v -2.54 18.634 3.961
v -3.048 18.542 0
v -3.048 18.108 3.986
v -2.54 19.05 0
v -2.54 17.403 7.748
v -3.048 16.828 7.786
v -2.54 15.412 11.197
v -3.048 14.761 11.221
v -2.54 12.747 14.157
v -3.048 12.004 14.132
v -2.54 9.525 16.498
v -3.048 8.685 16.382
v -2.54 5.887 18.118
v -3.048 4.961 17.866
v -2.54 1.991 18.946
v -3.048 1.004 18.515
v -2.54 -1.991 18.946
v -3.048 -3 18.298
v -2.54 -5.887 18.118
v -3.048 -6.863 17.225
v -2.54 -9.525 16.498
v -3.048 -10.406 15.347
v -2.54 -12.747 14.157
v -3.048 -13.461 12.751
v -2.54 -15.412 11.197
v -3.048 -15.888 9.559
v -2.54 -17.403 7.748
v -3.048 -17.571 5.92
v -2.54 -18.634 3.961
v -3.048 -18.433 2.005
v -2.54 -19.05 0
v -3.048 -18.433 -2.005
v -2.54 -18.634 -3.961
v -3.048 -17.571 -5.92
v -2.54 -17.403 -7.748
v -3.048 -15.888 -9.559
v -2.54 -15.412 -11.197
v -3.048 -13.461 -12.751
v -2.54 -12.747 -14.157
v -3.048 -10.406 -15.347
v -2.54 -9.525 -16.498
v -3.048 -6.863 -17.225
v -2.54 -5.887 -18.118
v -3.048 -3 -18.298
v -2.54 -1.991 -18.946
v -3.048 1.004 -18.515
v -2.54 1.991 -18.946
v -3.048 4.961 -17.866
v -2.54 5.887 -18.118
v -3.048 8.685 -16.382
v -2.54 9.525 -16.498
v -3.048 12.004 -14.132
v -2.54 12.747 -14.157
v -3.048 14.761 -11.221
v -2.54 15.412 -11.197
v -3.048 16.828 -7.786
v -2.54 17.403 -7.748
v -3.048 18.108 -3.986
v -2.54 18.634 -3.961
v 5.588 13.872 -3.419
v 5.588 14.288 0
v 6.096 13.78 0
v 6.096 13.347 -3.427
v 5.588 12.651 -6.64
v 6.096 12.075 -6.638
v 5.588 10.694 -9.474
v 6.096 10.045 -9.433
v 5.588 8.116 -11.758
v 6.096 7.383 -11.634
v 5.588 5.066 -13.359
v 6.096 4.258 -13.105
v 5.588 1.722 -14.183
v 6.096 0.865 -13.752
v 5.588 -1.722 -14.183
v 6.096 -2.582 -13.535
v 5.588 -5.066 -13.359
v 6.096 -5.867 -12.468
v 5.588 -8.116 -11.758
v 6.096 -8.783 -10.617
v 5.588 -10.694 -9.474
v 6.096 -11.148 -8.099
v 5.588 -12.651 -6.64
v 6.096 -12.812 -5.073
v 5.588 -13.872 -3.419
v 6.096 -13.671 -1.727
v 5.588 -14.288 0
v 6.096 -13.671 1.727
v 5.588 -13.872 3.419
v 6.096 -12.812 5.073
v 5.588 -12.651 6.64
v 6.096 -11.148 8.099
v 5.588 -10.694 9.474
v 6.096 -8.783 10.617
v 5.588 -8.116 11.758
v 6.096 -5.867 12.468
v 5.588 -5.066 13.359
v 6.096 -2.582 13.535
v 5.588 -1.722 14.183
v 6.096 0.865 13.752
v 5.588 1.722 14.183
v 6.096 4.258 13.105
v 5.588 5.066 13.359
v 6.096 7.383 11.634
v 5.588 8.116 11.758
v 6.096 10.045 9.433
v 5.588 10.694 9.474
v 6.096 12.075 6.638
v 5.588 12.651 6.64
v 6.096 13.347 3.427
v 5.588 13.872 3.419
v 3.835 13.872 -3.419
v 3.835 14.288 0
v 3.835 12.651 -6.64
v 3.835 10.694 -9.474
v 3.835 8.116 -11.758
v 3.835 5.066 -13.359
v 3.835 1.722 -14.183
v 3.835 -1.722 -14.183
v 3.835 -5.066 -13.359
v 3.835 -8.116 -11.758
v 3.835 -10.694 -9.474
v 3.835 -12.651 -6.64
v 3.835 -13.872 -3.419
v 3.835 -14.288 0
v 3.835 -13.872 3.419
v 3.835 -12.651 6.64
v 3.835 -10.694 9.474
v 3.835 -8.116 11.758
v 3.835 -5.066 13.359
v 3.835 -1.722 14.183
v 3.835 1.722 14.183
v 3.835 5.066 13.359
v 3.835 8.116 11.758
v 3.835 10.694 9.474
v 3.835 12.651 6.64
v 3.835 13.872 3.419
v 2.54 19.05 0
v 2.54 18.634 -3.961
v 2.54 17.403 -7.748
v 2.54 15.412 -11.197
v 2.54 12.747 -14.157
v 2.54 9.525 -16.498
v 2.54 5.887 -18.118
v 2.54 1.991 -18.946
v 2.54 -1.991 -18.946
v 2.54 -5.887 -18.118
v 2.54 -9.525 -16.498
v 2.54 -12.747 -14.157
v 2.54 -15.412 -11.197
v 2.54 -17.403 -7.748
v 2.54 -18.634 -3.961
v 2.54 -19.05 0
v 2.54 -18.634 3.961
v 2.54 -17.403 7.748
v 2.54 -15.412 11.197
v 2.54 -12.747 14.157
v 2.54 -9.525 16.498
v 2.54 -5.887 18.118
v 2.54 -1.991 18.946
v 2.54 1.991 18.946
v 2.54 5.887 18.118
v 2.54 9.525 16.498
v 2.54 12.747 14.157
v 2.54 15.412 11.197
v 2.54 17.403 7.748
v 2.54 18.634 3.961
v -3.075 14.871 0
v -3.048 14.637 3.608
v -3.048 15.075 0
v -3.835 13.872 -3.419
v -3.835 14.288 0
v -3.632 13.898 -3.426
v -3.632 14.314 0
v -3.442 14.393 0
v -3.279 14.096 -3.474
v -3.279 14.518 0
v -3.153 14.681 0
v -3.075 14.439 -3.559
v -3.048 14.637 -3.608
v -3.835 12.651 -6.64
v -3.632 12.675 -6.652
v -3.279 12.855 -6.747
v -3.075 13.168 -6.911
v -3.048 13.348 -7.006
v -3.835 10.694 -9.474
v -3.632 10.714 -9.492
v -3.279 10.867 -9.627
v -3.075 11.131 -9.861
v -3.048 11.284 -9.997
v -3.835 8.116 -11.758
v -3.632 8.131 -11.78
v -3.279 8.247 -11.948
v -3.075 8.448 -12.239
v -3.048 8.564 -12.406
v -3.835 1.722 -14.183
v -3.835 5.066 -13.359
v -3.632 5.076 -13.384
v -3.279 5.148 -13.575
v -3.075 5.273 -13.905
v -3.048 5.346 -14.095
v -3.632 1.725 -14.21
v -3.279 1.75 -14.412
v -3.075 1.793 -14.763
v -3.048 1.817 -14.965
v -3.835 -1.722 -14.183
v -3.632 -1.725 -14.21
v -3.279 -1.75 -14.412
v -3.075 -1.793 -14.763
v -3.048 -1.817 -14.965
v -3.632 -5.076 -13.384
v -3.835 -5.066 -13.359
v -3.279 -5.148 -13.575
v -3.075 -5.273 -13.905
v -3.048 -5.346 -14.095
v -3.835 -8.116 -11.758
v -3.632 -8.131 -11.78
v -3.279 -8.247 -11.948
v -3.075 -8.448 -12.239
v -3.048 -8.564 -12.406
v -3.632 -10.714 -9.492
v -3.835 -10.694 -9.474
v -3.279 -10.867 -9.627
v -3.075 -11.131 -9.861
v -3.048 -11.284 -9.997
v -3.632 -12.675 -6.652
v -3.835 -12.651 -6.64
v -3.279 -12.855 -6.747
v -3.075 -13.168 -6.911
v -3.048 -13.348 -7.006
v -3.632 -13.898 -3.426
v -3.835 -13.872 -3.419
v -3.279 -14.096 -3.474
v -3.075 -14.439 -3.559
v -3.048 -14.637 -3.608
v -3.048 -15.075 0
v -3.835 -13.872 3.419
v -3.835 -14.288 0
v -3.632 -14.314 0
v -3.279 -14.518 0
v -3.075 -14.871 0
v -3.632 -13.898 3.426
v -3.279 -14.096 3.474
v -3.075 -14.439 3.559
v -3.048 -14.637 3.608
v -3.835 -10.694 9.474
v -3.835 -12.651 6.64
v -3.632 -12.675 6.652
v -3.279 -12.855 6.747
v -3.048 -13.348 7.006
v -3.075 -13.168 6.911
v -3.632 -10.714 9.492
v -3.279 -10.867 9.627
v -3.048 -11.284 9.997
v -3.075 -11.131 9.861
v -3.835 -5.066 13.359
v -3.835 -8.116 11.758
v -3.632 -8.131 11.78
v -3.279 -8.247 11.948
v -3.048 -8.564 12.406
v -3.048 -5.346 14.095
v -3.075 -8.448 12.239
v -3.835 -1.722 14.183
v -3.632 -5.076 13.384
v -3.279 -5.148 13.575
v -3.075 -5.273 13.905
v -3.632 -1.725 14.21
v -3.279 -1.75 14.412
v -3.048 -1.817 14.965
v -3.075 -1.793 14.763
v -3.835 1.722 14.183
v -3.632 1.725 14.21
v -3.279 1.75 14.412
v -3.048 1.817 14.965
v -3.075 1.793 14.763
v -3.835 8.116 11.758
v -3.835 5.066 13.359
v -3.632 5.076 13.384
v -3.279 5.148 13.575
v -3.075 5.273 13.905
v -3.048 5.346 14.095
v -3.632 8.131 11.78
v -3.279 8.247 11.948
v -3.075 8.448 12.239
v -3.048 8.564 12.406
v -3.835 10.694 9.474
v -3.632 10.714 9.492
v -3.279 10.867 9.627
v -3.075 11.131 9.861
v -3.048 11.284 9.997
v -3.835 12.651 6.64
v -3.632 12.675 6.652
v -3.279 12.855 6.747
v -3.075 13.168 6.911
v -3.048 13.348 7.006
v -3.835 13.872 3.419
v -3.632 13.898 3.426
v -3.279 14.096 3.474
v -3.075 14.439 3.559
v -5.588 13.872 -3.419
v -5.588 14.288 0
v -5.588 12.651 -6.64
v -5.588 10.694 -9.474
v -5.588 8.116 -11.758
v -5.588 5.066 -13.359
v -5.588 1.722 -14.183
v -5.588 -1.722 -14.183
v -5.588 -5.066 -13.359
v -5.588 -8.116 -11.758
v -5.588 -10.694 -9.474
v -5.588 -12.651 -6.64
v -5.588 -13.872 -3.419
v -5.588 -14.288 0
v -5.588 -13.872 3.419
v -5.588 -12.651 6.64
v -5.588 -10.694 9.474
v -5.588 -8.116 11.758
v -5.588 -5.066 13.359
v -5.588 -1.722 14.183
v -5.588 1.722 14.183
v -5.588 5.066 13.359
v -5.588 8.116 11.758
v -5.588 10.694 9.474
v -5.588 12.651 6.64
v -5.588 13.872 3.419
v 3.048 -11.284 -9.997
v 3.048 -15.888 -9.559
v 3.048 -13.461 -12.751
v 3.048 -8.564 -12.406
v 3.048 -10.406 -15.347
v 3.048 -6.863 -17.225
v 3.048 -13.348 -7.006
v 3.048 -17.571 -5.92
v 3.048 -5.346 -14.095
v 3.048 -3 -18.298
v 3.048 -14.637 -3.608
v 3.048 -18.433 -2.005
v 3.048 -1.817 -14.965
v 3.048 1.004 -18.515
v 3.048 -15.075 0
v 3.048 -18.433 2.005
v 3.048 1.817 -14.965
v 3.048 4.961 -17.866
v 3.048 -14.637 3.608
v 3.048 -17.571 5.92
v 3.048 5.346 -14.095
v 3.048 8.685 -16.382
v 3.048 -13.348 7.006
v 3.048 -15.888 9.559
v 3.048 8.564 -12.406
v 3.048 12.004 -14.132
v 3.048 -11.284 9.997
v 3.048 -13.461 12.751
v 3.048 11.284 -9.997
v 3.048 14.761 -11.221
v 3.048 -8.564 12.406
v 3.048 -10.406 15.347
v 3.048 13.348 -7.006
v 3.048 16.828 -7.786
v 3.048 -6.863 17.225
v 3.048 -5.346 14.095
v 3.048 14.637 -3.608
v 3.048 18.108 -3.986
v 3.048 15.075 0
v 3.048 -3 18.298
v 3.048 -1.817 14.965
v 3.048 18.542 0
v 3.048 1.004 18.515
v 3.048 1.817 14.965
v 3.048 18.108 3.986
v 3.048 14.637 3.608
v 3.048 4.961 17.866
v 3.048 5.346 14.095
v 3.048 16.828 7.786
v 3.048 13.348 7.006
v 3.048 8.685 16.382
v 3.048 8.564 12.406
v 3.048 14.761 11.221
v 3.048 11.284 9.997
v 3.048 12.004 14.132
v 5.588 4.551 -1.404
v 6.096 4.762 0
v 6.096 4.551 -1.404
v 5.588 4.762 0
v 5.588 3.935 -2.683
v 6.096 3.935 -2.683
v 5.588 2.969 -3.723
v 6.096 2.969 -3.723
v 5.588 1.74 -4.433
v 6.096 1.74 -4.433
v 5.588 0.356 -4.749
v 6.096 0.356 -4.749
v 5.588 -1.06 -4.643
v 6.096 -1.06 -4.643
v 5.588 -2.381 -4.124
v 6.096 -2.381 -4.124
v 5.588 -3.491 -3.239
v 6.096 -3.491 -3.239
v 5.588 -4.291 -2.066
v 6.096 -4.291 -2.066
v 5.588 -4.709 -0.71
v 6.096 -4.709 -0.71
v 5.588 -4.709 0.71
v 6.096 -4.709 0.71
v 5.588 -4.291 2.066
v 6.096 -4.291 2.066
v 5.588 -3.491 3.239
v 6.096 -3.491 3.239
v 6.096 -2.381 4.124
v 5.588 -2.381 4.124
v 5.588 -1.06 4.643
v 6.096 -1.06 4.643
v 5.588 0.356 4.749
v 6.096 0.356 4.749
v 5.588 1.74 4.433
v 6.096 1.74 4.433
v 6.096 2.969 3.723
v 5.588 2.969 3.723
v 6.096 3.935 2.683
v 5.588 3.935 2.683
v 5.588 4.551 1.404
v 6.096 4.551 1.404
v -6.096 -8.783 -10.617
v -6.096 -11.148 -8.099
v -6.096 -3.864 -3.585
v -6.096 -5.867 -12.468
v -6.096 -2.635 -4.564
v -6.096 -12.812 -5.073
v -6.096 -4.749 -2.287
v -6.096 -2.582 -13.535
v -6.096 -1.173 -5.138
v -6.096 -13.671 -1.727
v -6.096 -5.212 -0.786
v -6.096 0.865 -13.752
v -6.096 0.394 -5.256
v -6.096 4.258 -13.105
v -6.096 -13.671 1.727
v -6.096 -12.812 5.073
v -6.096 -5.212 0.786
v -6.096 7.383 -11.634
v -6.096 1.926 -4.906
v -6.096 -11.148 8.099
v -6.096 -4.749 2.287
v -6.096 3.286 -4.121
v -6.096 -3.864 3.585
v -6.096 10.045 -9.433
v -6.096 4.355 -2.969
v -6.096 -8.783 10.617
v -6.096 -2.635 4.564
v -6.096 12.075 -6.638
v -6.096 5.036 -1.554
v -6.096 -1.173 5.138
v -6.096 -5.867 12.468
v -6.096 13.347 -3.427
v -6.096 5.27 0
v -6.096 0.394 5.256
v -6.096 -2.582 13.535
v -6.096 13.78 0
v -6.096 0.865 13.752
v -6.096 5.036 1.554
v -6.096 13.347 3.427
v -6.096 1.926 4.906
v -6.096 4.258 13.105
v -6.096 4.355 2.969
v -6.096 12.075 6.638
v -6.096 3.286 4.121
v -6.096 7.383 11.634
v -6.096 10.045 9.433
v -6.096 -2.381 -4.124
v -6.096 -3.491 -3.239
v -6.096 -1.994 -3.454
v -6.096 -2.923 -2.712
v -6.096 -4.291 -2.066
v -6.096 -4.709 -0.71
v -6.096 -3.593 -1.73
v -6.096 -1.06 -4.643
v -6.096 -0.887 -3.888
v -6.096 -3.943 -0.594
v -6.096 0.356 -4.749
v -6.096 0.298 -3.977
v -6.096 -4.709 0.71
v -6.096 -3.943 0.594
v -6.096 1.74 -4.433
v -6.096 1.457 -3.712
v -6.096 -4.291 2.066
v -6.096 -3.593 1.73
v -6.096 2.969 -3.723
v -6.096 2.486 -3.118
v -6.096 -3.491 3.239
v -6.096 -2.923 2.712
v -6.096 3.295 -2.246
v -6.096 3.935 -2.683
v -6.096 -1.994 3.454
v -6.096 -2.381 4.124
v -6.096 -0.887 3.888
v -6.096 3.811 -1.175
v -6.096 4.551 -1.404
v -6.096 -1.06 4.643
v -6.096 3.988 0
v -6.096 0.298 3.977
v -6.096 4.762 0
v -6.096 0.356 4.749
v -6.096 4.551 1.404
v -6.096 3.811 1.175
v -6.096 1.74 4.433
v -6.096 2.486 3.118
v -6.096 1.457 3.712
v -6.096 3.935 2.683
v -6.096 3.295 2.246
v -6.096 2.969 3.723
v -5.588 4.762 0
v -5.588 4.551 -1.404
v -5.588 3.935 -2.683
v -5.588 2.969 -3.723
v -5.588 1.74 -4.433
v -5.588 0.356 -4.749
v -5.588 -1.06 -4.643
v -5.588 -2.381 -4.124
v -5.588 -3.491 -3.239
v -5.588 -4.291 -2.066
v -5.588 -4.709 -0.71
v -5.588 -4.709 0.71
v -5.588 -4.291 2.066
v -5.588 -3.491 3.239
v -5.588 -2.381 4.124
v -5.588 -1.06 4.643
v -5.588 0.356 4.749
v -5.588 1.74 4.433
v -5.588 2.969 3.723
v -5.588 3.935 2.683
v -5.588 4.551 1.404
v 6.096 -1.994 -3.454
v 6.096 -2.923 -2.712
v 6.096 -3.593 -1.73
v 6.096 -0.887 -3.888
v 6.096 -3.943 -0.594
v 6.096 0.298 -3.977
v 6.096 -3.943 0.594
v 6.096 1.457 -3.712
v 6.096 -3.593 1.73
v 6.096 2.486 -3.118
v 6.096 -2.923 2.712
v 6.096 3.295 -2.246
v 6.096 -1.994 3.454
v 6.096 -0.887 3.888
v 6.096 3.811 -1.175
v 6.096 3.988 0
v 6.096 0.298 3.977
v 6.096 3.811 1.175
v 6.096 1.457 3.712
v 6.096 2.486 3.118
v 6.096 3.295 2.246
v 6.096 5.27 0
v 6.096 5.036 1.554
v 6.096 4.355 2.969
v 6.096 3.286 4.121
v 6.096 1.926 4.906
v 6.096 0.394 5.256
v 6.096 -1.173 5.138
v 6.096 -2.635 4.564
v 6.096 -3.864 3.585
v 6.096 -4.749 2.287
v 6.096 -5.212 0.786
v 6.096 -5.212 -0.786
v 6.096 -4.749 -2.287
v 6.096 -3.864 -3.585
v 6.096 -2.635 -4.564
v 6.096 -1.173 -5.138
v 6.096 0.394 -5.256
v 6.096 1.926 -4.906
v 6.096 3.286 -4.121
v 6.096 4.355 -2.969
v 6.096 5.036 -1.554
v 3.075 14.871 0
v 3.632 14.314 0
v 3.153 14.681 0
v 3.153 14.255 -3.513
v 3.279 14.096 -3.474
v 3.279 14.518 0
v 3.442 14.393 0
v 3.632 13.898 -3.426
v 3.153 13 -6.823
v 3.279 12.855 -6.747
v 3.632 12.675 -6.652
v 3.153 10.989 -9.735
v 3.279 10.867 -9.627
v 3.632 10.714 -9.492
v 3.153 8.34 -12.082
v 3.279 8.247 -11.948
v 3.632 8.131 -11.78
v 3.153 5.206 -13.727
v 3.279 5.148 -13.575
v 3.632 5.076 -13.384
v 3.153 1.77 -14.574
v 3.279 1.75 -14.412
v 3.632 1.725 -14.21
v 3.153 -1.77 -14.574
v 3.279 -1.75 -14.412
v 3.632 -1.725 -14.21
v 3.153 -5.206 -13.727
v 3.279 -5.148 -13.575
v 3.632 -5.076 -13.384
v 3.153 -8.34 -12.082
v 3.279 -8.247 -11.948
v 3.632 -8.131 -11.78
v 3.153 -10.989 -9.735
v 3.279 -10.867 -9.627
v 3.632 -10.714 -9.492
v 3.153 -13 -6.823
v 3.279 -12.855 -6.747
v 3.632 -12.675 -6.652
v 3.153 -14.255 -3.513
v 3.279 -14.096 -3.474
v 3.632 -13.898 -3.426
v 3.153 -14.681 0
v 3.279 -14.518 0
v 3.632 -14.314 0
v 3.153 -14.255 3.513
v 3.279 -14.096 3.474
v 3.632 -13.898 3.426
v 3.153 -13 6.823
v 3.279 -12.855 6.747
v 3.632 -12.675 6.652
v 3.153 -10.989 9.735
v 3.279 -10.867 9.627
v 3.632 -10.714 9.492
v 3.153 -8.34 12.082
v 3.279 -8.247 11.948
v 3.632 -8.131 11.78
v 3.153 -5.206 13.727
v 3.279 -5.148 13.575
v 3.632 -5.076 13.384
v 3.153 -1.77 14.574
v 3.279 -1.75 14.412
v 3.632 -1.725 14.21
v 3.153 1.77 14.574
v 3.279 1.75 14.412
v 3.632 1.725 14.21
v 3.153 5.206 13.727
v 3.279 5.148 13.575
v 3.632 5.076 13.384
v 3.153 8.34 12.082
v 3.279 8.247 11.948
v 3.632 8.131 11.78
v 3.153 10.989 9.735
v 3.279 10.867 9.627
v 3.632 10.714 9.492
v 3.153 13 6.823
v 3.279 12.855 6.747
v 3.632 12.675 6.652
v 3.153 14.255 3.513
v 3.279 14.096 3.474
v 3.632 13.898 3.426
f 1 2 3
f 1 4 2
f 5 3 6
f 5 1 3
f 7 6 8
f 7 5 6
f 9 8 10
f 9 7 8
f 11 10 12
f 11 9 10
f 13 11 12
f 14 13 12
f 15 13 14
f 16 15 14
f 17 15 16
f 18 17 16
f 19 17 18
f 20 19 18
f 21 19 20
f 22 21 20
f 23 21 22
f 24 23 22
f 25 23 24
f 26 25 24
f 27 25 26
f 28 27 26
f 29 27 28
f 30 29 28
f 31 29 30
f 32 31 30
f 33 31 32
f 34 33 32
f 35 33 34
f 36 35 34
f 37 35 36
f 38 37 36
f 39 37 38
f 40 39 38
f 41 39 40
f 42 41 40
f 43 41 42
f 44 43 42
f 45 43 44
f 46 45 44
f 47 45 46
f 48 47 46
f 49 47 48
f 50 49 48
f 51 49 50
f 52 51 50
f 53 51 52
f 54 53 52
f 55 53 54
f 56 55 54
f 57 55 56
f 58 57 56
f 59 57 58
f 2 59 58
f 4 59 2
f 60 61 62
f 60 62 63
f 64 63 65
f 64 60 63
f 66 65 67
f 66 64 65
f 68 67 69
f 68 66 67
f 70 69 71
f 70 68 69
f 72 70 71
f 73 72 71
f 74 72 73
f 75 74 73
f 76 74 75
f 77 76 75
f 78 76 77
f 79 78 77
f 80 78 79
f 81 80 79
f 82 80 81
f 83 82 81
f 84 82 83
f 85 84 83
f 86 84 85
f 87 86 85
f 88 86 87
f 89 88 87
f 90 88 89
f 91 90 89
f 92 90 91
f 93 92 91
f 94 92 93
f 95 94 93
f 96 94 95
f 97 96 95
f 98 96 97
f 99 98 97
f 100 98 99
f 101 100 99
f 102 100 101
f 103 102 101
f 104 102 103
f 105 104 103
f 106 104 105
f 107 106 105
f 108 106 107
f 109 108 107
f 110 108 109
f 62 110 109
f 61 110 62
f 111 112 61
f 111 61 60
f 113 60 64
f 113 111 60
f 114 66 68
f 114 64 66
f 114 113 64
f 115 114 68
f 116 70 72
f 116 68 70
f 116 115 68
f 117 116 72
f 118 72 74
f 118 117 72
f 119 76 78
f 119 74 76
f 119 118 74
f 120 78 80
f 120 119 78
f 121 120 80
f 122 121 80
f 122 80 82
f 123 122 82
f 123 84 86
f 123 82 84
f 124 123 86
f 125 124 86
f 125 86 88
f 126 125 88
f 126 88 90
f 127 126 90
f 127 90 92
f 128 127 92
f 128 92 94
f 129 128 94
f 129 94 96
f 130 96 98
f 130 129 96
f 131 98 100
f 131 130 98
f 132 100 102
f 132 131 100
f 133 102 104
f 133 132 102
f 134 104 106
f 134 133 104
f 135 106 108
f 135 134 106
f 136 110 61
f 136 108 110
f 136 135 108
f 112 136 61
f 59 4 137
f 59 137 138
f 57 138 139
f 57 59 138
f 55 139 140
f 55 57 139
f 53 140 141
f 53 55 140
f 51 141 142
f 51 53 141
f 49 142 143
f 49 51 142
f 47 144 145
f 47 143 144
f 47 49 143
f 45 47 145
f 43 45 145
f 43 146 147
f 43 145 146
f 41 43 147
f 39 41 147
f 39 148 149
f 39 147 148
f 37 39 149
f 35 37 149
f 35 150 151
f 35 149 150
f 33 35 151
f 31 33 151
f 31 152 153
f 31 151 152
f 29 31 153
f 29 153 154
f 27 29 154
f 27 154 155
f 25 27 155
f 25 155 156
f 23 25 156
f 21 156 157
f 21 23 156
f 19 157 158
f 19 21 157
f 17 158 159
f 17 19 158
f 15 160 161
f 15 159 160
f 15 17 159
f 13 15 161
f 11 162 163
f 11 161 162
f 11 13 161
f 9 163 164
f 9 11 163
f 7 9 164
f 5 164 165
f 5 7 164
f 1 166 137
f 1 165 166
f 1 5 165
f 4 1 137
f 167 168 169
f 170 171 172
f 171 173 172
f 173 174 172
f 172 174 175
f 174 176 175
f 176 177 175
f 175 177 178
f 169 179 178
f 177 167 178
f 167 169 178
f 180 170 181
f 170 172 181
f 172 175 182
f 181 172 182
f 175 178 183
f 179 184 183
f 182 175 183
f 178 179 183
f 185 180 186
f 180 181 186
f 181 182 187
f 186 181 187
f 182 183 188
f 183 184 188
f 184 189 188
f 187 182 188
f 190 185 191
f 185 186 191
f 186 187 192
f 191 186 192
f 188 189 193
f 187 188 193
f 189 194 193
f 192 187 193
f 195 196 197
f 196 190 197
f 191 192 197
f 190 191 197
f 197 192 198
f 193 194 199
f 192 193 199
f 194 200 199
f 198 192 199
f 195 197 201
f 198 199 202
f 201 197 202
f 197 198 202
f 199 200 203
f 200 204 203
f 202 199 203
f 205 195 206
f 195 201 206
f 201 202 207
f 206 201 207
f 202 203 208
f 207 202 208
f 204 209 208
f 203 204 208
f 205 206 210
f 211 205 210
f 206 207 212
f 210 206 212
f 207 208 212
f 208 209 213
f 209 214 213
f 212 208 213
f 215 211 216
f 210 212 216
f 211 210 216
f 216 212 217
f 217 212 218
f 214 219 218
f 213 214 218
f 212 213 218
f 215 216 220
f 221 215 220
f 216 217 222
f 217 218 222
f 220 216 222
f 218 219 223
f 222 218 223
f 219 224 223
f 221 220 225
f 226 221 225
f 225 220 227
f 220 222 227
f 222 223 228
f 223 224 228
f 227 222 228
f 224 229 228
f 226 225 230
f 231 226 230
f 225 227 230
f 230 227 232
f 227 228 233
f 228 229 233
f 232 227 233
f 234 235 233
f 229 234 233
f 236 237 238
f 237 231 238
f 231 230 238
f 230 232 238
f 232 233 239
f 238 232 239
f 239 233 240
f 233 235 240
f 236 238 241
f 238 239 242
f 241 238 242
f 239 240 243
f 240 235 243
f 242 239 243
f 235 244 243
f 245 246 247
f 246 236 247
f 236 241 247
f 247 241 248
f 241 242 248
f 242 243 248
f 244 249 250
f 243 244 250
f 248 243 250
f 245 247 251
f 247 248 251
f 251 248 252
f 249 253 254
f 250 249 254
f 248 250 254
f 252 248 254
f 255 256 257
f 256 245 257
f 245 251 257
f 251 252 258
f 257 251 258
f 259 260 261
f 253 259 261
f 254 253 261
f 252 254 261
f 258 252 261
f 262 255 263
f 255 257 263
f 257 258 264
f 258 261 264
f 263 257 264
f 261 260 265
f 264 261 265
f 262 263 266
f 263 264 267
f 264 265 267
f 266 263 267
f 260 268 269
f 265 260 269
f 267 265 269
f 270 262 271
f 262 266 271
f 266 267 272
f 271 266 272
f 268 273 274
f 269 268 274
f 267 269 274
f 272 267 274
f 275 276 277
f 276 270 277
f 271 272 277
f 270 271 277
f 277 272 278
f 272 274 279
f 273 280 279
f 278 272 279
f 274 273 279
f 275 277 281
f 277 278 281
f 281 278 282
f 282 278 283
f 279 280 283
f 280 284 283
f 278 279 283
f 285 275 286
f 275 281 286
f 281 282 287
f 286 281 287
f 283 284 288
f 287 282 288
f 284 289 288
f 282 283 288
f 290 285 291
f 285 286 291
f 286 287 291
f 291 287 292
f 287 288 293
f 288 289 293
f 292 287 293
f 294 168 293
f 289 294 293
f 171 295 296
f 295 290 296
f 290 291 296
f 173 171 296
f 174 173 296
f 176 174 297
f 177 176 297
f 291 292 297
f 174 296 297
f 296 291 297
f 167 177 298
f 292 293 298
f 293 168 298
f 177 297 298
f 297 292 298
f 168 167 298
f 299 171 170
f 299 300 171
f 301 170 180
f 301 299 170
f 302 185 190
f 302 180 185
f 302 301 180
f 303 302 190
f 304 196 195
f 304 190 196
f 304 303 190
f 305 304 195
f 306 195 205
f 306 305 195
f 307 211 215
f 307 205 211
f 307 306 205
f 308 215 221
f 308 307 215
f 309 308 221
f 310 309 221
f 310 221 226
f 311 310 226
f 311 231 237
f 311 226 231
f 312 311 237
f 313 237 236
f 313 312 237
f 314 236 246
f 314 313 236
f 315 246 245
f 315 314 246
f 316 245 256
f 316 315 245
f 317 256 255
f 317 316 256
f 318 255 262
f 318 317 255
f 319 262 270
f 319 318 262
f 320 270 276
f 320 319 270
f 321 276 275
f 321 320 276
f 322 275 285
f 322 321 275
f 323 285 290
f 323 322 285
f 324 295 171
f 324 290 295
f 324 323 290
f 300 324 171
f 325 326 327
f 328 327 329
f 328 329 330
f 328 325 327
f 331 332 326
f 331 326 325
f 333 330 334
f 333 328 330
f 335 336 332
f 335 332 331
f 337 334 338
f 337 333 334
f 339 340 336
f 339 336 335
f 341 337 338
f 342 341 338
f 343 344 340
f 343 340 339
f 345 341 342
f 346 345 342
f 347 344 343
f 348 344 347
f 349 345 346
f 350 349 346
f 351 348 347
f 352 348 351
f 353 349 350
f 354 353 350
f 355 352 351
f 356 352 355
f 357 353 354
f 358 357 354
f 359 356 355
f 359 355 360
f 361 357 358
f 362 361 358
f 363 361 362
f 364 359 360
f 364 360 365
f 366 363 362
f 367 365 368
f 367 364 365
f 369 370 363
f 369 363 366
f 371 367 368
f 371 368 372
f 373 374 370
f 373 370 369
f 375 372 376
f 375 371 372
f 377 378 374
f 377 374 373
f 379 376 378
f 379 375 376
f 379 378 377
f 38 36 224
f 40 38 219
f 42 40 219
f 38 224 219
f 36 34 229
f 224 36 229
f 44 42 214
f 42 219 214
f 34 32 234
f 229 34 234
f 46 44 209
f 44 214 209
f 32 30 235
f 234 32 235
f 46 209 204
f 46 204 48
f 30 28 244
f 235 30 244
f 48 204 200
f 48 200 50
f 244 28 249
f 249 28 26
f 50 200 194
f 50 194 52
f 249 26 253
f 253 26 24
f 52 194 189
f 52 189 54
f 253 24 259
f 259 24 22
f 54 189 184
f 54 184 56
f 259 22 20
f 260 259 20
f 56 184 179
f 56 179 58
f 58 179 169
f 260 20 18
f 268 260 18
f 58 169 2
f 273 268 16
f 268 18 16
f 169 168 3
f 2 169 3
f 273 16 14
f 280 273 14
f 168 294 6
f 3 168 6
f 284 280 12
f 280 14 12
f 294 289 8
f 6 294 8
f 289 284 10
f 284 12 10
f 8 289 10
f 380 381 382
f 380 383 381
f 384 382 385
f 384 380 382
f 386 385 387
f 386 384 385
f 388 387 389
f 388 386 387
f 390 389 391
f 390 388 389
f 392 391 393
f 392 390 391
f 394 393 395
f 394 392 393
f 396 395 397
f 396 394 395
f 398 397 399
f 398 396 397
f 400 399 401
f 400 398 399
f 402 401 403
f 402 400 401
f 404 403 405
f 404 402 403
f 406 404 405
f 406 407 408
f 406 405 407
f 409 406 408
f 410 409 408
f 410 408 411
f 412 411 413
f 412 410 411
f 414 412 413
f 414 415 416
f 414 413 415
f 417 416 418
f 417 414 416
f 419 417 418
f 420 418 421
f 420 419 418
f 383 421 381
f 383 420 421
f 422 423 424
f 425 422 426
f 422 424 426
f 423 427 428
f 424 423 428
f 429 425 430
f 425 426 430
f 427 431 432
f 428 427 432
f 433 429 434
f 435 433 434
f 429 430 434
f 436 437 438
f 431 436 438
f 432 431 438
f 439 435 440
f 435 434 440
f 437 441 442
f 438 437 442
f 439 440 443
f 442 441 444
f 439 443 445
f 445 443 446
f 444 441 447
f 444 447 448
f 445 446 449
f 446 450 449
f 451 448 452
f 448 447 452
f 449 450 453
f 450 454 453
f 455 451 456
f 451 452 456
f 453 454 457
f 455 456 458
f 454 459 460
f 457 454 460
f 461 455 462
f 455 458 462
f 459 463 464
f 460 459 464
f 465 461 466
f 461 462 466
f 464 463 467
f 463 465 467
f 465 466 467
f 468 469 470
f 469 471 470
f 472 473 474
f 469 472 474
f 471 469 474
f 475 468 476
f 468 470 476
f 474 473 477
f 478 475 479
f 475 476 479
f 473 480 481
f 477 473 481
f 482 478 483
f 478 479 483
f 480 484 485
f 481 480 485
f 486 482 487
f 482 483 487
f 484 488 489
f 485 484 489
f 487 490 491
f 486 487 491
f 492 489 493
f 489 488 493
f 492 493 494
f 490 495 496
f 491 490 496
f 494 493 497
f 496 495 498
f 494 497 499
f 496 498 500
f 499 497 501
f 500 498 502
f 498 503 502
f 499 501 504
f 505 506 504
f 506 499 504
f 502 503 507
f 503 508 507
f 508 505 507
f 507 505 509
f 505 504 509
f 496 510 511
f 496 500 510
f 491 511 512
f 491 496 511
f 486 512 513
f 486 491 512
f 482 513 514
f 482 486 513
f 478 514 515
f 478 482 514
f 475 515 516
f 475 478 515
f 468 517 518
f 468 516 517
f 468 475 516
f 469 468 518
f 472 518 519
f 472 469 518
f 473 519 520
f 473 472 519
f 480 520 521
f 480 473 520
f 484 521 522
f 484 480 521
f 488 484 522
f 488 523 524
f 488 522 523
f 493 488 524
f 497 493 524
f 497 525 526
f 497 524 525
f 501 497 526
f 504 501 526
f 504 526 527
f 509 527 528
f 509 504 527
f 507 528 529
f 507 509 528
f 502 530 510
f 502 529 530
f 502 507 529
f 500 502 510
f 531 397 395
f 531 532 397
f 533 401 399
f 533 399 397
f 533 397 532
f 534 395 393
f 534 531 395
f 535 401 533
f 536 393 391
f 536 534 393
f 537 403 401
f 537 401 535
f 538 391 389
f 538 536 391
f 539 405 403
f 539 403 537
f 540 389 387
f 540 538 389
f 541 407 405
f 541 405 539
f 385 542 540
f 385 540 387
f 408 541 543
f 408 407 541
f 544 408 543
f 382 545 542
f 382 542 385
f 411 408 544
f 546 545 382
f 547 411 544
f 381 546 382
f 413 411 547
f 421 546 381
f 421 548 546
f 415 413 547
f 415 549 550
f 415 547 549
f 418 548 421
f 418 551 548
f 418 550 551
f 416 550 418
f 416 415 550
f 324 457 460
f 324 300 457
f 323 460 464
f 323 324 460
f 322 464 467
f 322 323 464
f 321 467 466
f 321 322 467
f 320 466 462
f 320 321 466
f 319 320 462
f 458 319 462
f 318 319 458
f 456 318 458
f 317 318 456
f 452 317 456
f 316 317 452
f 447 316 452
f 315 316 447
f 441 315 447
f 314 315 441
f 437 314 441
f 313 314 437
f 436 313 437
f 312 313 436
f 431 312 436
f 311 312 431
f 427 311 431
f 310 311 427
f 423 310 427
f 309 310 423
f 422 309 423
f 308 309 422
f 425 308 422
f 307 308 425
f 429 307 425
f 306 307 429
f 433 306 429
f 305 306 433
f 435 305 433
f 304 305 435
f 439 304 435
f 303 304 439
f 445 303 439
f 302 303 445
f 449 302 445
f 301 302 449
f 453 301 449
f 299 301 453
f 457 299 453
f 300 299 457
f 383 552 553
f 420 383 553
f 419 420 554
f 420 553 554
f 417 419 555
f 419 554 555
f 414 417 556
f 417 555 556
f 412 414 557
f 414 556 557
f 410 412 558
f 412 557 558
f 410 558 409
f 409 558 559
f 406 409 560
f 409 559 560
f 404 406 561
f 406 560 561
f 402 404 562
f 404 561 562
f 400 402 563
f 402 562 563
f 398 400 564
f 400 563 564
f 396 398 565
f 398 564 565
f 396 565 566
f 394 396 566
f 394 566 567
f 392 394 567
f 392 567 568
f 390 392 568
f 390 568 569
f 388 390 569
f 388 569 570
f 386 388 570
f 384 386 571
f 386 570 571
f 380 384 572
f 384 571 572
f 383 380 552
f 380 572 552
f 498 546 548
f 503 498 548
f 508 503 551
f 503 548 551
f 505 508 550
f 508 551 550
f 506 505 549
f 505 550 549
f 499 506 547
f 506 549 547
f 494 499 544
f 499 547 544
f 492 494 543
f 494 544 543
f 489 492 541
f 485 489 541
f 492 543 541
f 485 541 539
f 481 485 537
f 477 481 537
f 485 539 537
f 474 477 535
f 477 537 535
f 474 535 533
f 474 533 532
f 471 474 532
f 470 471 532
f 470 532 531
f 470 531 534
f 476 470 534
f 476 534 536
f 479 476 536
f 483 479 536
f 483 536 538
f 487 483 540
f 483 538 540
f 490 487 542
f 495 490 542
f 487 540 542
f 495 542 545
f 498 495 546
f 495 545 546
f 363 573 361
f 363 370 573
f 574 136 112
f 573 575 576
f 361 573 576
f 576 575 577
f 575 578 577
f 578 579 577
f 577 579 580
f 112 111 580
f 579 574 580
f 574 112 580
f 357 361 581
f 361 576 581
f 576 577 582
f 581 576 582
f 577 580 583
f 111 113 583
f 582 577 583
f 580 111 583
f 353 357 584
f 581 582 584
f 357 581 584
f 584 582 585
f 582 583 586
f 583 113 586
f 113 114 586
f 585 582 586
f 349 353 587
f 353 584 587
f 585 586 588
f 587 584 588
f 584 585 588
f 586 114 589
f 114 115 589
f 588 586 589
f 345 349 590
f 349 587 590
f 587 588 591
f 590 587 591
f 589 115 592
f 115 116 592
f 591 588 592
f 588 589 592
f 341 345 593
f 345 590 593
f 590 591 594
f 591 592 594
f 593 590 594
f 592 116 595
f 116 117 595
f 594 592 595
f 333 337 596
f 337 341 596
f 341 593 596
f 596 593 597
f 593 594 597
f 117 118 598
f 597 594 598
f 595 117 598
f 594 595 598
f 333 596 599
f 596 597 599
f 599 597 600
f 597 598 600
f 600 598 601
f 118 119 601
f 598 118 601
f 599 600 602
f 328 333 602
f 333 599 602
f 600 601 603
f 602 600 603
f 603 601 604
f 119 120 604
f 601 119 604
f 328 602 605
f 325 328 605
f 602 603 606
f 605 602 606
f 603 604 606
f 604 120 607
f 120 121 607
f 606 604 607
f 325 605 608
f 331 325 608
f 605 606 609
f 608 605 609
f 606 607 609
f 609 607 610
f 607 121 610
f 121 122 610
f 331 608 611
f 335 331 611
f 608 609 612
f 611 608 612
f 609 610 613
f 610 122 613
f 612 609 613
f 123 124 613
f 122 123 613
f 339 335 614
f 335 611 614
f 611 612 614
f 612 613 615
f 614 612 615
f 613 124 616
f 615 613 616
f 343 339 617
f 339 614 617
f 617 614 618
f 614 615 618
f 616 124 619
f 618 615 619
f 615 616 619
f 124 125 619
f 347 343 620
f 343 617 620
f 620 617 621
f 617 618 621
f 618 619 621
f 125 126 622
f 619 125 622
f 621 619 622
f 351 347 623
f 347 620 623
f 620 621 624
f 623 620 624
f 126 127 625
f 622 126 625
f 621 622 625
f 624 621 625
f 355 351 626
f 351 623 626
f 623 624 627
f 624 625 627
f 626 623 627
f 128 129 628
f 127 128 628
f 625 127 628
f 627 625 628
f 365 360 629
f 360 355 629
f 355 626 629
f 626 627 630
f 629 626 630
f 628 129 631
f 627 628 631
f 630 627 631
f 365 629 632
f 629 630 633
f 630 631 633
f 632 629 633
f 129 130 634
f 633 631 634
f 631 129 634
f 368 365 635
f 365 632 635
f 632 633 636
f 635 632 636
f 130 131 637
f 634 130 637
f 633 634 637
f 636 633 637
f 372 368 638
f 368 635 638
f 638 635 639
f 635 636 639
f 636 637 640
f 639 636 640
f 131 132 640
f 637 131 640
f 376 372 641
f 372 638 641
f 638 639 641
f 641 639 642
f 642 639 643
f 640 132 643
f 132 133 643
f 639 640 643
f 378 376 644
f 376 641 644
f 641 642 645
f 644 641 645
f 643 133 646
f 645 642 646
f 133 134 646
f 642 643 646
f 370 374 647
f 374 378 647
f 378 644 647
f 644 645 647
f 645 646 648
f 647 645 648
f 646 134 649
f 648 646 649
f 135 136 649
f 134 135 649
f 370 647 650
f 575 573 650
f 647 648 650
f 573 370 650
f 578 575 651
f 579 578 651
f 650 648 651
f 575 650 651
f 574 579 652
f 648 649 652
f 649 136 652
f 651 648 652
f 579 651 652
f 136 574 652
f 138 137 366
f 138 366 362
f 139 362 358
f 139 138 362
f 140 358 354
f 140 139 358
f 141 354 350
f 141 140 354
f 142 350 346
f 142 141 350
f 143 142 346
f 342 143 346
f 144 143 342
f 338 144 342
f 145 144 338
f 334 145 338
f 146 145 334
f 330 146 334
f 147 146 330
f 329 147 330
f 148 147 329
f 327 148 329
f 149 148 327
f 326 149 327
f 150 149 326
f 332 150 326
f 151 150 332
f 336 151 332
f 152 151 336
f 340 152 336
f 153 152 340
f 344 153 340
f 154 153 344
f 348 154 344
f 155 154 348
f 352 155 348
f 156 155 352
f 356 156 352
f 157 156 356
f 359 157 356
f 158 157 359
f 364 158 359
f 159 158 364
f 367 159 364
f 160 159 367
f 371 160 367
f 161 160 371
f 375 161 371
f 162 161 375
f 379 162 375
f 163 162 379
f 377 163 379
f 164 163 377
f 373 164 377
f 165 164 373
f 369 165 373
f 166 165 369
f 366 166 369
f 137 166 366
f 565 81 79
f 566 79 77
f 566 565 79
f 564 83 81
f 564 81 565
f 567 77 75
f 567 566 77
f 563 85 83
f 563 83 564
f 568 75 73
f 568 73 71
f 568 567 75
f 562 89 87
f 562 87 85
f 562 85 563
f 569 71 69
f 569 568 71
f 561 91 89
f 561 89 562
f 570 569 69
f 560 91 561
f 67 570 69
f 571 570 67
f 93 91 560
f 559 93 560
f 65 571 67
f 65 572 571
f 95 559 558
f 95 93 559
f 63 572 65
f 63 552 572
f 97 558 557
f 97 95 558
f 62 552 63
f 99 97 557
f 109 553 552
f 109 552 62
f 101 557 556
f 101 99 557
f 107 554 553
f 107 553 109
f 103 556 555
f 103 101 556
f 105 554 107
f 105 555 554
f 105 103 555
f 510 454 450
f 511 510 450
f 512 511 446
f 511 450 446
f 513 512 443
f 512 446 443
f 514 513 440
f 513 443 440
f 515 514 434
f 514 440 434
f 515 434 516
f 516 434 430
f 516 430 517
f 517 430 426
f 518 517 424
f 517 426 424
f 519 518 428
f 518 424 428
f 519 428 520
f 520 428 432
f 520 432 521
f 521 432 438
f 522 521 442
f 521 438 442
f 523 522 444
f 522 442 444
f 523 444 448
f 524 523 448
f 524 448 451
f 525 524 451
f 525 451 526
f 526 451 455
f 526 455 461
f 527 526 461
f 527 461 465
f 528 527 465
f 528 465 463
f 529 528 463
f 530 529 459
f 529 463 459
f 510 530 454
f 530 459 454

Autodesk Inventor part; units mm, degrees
sketch "Sketch_1" plane through (0, 0, 0) normal (0, 0, 1) x (1, 0, 0)
  line L0 (6.096, 0) -> (-6.096, 0)
  line L1 (-6.096, 5.2705) -> (-5.588, 4.7625)
  line L2 (-5.588, 4.7625) -> (5.588, 4.7625)
  line L3 (5.588, 4.7625) -> (6.096, 5.2705)
  line L4 (6.096, 5.2705) -> (6.096, 13.7795)
  line L5 (6.096, 13.7795) -> (5.588, 14.2875)
  line L6 (5.588, 14.2875) -> (3.8354, 14.2875)
  arc A0 (3.048, 15.0749) -> (3.8354, 14.2875) centre (3.8354, 15.0749) ccw
  line L7 (3.048, 15.0749) -> (3.048, 18.542)
  line L8 (3.048, 18.542) -> (2.54, 19.05)
  line L9 (2.54, 19.05) -> (-2.54, 19.05)
  line L10 (-2.54, 19.05) -> (-3.048, 18.542)
  line L11 (-3.048, 18.542) -> (-3.048, 15.0749)
  arc A1 (-3.8354, 14.2875) -> (-3.048, 15.0749) centre (-3.8354, 15.0749) ccw
  line L12 (-3.8354, 14.2875) -> (-5.588, 14.2875)
  line L13 (-5.588, 14.2875) -> (-6.096, 13.7795)
  line L14 (-6.096, 13.7795) -> (-6.096, 5.2705)
revolve "Revolution1" add sketch "Sketch_1" angle 360 about axis through (6.096, 0, 0) along (1, 0, 0)
sketch "Sketch_2" plane through (0, 0, 0) normal (0, 0, 1) x (1, 0, 0)
  line L0 (6.096, 0) -> (-6.096, 0)
  line L1 (-6.096, 4.7625) -> (-6.096, 3.9878)
  line L2 (-6.096, 3.9878) -> (6.096, 3.9878)
  line L3 (6.096, 3.9878) -> (6.096, 4.7625)
  line L4 (6.096, 4.7625) -> (-6.096, 4.7625)
revolve "Revolution2" add sketch "Sketch_2" angle 360 about axis through (6.096, 0, 0) along (1, 0, 0)
ref_plane "to_bolt_XY" through (6.096, 0, 0) normal (1, 0, 0) x (0, 0, -1)
ref_plane "to_bolt_YZ" through (6.096, 0, 0) normal (0, 0, -1) x (0, 1, 0)
ref_plane "to_bolt_ZX" through (6.096, 0, 0) normal (0, 1, 0) x (1, 0, 0)
ref_plane "wheel_XY" through (0, 0, 0) normal (1, 0, 0) x (0, 0, -1)
ref_plane "wheel_YZ" through (0, 0, 0) normal (0, 0, -1) x (0, 1, 0)
ref_plane "wheel_ZX" through (0, 0, 0) normal (0, 1, 0) x (1, 0, 0)
properties part number "2281_w"
